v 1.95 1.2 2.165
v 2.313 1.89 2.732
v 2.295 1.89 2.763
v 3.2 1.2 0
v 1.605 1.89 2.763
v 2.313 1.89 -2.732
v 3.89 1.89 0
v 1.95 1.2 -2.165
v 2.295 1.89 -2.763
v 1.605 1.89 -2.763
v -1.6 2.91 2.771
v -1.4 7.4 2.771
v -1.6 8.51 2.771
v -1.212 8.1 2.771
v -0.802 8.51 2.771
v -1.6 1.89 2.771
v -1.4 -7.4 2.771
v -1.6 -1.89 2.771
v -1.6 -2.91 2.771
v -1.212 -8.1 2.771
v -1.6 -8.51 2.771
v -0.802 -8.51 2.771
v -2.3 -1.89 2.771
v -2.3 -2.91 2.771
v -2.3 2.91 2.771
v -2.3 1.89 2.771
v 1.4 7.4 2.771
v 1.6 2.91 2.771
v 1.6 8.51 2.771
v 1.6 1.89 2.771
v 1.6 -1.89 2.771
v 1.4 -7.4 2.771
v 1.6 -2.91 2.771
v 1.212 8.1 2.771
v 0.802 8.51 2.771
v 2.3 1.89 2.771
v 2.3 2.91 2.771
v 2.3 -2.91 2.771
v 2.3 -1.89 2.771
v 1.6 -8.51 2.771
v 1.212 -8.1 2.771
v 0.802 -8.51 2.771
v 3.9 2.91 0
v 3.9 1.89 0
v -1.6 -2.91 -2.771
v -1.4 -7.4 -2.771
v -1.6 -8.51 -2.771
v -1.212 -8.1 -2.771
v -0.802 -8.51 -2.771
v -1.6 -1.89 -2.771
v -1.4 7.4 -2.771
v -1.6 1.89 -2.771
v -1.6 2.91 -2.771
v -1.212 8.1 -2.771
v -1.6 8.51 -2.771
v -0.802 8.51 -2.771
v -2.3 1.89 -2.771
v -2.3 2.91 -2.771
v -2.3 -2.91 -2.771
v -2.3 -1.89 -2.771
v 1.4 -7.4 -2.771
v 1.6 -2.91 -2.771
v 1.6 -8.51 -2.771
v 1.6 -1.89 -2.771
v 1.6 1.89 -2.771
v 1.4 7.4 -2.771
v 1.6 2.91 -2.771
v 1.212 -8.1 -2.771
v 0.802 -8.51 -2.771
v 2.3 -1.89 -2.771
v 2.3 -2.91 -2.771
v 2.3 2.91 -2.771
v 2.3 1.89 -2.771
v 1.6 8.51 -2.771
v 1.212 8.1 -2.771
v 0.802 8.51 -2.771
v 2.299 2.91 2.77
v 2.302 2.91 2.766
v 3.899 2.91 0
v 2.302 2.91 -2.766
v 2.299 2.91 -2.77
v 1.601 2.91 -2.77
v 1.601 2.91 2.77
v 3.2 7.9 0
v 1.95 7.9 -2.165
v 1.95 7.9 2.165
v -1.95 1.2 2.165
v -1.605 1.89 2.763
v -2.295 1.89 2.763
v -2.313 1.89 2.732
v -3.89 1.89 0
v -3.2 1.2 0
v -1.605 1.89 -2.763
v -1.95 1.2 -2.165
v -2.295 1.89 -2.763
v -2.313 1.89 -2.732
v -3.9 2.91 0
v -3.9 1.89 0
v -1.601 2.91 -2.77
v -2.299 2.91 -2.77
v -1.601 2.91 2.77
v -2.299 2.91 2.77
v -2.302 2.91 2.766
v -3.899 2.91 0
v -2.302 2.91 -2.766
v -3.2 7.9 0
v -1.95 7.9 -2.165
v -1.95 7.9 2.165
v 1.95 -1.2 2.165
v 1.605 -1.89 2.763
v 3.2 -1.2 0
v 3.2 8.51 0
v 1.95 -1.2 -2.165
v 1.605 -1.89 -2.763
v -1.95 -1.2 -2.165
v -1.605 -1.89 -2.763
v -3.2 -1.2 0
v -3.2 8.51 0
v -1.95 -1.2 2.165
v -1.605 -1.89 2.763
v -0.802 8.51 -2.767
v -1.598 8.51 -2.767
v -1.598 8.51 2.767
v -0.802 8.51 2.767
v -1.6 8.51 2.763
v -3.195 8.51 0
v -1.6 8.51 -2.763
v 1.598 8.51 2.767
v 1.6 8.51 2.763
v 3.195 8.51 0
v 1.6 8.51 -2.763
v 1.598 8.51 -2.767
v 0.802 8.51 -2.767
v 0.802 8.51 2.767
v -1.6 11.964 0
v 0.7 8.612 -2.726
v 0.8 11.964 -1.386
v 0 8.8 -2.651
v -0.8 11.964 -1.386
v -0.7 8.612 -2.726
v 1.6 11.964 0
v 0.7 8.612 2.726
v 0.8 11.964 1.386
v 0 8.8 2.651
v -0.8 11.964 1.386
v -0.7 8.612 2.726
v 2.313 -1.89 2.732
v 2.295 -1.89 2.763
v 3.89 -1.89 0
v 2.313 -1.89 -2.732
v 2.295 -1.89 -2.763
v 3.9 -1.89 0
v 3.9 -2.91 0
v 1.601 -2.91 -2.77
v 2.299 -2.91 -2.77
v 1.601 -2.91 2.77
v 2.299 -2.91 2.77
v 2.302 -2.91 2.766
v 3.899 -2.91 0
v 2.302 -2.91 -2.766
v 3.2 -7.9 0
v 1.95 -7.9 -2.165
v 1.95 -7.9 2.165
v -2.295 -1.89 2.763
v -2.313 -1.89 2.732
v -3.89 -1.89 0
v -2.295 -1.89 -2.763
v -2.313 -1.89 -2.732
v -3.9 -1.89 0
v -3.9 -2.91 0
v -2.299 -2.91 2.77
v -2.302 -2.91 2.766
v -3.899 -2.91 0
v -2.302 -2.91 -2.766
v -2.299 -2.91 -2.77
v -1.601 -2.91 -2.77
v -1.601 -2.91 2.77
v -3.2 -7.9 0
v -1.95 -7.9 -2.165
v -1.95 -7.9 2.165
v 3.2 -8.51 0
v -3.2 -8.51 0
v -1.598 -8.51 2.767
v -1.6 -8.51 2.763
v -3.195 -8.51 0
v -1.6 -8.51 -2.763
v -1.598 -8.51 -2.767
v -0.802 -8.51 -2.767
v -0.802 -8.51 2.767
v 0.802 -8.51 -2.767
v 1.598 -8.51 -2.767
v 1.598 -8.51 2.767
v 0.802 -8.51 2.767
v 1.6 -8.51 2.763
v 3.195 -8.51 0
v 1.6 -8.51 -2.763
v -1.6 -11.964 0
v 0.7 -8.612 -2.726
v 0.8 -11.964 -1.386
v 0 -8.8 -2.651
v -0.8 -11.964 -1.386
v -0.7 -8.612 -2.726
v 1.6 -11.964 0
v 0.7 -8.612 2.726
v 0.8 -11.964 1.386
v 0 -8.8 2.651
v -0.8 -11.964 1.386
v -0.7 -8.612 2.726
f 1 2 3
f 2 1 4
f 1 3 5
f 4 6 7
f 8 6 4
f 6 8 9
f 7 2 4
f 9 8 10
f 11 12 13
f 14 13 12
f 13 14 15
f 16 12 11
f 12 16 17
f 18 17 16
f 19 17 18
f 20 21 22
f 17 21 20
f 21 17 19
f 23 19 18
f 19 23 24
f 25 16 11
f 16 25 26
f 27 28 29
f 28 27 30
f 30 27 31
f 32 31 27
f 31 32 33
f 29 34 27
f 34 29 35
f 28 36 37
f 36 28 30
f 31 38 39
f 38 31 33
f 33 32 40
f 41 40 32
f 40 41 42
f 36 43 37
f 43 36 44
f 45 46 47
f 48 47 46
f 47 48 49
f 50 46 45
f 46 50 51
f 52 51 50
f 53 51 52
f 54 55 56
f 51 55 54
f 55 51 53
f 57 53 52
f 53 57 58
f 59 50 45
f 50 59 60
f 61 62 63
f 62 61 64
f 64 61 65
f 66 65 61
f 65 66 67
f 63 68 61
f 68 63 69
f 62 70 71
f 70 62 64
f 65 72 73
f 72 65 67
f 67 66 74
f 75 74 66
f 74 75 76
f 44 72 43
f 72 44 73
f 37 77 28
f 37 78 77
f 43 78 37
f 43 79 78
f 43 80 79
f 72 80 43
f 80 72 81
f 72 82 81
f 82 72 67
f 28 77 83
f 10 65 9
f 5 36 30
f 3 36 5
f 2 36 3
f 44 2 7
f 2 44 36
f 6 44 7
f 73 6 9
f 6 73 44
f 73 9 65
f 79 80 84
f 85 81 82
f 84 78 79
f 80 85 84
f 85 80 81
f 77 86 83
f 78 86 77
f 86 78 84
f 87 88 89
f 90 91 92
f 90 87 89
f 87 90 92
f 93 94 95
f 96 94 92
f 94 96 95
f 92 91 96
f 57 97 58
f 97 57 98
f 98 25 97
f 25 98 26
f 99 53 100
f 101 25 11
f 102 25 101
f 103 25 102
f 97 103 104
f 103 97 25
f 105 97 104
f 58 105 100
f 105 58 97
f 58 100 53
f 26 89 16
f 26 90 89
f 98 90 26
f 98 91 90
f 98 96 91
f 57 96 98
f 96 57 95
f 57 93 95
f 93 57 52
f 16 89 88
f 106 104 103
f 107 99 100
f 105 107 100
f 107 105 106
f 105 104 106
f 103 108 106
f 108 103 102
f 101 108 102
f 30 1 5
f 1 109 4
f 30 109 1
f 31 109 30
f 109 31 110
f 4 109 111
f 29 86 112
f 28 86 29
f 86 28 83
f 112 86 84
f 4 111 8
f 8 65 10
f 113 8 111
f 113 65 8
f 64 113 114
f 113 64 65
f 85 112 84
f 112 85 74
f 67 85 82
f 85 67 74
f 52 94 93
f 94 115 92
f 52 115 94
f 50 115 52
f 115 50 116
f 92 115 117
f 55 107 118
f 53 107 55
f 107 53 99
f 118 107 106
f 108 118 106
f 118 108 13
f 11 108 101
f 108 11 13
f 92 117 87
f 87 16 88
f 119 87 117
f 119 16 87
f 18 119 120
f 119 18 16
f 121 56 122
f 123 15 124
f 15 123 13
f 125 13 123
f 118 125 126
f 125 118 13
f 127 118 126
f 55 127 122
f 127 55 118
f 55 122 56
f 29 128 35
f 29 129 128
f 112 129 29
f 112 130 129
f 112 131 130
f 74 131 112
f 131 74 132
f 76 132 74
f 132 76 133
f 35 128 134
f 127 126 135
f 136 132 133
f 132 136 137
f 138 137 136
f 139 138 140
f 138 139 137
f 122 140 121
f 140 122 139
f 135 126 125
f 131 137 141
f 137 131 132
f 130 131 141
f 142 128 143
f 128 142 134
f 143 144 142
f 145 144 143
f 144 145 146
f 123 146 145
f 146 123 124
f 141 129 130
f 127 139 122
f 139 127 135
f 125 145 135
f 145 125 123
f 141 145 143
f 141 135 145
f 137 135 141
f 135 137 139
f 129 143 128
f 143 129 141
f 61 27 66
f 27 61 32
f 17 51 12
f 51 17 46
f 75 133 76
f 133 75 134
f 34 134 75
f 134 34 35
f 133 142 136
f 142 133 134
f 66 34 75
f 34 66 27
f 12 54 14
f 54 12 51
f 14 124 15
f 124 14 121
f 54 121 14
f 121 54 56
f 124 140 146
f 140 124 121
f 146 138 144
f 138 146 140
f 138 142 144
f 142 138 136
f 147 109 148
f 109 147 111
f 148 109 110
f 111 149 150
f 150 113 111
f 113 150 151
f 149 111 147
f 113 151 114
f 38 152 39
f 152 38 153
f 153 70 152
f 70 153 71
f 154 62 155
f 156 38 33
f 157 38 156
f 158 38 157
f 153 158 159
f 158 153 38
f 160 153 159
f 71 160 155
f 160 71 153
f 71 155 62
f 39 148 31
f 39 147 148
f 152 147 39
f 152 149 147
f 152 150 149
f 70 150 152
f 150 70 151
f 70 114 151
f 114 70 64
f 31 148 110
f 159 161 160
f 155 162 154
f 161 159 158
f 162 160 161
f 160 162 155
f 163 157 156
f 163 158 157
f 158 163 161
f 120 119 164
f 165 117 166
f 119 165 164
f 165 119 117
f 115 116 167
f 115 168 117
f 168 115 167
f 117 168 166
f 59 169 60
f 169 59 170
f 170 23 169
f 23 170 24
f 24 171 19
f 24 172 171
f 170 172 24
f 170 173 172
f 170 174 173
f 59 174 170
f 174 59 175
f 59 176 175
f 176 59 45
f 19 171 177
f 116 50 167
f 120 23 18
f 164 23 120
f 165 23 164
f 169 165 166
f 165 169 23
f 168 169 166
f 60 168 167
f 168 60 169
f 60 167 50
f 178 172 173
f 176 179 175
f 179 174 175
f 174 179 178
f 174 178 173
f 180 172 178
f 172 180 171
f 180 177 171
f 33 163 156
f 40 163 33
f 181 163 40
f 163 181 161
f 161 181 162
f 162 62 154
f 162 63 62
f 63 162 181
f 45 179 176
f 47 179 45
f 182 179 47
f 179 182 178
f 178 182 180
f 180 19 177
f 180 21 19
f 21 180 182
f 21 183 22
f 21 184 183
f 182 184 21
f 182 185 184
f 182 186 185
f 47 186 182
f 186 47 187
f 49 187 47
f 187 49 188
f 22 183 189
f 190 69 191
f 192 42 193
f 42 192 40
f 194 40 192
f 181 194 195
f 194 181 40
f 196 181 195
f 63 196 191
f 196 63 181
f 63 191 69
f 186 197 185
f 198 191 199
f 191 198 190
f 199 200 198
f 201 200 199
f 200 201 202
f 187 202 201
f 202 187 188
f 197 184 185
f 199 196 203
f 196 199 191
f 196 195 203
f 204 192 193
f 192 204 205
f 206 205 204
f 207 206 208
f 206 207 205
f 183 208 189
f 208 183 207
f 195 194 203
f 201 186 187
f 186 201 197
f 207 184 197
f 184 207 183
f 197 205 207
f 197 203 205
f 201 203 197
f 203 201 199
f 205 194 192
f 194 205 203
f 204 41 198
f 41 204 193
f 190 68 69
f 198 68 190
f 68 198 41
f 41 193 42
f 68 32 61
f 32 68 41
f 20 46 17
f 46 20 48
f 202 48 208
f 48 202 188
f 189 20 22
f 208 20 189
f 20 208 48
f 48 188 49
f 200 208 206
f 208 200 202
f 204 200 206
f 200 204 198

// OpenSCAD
// new pin connectors

object=0;//[0:Pinpeg,1:Pinhole]
//Pinpeg is twice this length
length=13;
//Of hole; pinpeg is smaller to fit
diameter=7;
//Only affects pinhole
hole_twist=0;//[0:free,1:fixed]
//Pulls the snaps together on the pinpeg to ensure a tight coupling
preload=0.1;
//Allows pins to fit easily into holes
clearance=0.3;
//Thicker makes the pinpeg stiffer
thickness=1.8;
//Height of snap nubs
snap=0.4;
//Put fins on pinhole to help with printing strength
fins=1;//[1:yes,0:no]

$fn=6;

//if(object==0)
    pinpeg(r=diameter/2,l=length,d=2.5-preload,nub=snap,t=thickness,space=clearance);
//if(object==1)
    %pinhole(r=diameter/2,l=length,nub=snap,fixed=hole_twist,fins=fins);

//pin(flat=0);
//%pinhole(fixed=true);

//pinpeg();
//translate([10,0,0])difference(){
//	cylinder(r=5.5,h=14);
//	pinhole(fixed=true);
//}
//translate([-10,0,0])difference(){
//	cylinder(r=5.5,h=14);
//	pinhole(fixed=false);
//}

module pin(r=3.5,l=13,d=2.4,slot=8,nub=0.4,t=1.8,space=0.3,flat=0)
//translate(flat*[0,0,r/sqrt(2)-space])rotate([0,0,0])
difference(){
	rotate([-90,0,0])intersection(){
		union(){
			translate([0,0,-0.01])cylinder(r=r-space,h=l-r-0.98);
            //translate([0,0,l-r-1])cylinder(r1=r-space,r2=0,h=r-space/2+1);
            translate([0,0,l-r-1])scale([1,1,1.25]) sphere(r=r-space);
			translate([nub+space,0,d])nub(r-space,nub+space);
			translate([-nub-space,0,d])nub(r-space,nub+space);
		}
		//cube([3*r,r*sqrt(2)-2*space,2*l+3*r],center=true);
	}
	translate([0,d,0])cube([2*(r-t-space),slot+2,2*r],center=true);
	translate([0,d-slot/2-1,0])cylinder(r=r-t-space,h=2*r,center=true,$fn=12);
	translate([0,d+slot/2+1,0])cylinder(r=r-t-space,h=2*r,center=true,$fn=12);
}

module nub(r,nub)
union(){
	translate([0,0,-nub-0.5])cylinder(r1=r-nub,r2=r,h=nub);
	cylinder(r=r,h=1.02,center=true);
	translate([0,0,0.5])cylinder(r1=r,r2=r-nub,h=5);
}

module pinhole(r=3.5,l=13,d=2.5,nub=0.4,fixed=false,fins=true)
intersection(){
	union(){
		translate([0,0,-0.1])cylinder(r=r,h=l-r+0.1);
		//translate([0,0,l-r-0.01])cylinder(r1=r,r2=0,h=r);
		translate([0,0,l-r-1]) scale([1,1,1.25]) sphere(r=r);
        translate([0,0,d])nub(r+nub,nub);
		if(fins)translate([0,0,l-r]){
			cube([2*r,0.01,2*r],center=true);
			cube([0.01,2*r,2*r],center=true);
		}
	}
	*if(fixed)cube([3*r,r*sqrt(2),2*l+3*r],center=true);
}

module pinpeg(r=3.5,l=13,d=2.4,nub=0.4,t=1.8,space=0.3)
union(){
	pin(r=r,l=l,d=d,nub=nub,t=t,space=space,flat=.5);
	mirror([0,1,0])pin(r=r,l=l,d=d,nub=nub,t=t,space=space,flat=.5);
}
